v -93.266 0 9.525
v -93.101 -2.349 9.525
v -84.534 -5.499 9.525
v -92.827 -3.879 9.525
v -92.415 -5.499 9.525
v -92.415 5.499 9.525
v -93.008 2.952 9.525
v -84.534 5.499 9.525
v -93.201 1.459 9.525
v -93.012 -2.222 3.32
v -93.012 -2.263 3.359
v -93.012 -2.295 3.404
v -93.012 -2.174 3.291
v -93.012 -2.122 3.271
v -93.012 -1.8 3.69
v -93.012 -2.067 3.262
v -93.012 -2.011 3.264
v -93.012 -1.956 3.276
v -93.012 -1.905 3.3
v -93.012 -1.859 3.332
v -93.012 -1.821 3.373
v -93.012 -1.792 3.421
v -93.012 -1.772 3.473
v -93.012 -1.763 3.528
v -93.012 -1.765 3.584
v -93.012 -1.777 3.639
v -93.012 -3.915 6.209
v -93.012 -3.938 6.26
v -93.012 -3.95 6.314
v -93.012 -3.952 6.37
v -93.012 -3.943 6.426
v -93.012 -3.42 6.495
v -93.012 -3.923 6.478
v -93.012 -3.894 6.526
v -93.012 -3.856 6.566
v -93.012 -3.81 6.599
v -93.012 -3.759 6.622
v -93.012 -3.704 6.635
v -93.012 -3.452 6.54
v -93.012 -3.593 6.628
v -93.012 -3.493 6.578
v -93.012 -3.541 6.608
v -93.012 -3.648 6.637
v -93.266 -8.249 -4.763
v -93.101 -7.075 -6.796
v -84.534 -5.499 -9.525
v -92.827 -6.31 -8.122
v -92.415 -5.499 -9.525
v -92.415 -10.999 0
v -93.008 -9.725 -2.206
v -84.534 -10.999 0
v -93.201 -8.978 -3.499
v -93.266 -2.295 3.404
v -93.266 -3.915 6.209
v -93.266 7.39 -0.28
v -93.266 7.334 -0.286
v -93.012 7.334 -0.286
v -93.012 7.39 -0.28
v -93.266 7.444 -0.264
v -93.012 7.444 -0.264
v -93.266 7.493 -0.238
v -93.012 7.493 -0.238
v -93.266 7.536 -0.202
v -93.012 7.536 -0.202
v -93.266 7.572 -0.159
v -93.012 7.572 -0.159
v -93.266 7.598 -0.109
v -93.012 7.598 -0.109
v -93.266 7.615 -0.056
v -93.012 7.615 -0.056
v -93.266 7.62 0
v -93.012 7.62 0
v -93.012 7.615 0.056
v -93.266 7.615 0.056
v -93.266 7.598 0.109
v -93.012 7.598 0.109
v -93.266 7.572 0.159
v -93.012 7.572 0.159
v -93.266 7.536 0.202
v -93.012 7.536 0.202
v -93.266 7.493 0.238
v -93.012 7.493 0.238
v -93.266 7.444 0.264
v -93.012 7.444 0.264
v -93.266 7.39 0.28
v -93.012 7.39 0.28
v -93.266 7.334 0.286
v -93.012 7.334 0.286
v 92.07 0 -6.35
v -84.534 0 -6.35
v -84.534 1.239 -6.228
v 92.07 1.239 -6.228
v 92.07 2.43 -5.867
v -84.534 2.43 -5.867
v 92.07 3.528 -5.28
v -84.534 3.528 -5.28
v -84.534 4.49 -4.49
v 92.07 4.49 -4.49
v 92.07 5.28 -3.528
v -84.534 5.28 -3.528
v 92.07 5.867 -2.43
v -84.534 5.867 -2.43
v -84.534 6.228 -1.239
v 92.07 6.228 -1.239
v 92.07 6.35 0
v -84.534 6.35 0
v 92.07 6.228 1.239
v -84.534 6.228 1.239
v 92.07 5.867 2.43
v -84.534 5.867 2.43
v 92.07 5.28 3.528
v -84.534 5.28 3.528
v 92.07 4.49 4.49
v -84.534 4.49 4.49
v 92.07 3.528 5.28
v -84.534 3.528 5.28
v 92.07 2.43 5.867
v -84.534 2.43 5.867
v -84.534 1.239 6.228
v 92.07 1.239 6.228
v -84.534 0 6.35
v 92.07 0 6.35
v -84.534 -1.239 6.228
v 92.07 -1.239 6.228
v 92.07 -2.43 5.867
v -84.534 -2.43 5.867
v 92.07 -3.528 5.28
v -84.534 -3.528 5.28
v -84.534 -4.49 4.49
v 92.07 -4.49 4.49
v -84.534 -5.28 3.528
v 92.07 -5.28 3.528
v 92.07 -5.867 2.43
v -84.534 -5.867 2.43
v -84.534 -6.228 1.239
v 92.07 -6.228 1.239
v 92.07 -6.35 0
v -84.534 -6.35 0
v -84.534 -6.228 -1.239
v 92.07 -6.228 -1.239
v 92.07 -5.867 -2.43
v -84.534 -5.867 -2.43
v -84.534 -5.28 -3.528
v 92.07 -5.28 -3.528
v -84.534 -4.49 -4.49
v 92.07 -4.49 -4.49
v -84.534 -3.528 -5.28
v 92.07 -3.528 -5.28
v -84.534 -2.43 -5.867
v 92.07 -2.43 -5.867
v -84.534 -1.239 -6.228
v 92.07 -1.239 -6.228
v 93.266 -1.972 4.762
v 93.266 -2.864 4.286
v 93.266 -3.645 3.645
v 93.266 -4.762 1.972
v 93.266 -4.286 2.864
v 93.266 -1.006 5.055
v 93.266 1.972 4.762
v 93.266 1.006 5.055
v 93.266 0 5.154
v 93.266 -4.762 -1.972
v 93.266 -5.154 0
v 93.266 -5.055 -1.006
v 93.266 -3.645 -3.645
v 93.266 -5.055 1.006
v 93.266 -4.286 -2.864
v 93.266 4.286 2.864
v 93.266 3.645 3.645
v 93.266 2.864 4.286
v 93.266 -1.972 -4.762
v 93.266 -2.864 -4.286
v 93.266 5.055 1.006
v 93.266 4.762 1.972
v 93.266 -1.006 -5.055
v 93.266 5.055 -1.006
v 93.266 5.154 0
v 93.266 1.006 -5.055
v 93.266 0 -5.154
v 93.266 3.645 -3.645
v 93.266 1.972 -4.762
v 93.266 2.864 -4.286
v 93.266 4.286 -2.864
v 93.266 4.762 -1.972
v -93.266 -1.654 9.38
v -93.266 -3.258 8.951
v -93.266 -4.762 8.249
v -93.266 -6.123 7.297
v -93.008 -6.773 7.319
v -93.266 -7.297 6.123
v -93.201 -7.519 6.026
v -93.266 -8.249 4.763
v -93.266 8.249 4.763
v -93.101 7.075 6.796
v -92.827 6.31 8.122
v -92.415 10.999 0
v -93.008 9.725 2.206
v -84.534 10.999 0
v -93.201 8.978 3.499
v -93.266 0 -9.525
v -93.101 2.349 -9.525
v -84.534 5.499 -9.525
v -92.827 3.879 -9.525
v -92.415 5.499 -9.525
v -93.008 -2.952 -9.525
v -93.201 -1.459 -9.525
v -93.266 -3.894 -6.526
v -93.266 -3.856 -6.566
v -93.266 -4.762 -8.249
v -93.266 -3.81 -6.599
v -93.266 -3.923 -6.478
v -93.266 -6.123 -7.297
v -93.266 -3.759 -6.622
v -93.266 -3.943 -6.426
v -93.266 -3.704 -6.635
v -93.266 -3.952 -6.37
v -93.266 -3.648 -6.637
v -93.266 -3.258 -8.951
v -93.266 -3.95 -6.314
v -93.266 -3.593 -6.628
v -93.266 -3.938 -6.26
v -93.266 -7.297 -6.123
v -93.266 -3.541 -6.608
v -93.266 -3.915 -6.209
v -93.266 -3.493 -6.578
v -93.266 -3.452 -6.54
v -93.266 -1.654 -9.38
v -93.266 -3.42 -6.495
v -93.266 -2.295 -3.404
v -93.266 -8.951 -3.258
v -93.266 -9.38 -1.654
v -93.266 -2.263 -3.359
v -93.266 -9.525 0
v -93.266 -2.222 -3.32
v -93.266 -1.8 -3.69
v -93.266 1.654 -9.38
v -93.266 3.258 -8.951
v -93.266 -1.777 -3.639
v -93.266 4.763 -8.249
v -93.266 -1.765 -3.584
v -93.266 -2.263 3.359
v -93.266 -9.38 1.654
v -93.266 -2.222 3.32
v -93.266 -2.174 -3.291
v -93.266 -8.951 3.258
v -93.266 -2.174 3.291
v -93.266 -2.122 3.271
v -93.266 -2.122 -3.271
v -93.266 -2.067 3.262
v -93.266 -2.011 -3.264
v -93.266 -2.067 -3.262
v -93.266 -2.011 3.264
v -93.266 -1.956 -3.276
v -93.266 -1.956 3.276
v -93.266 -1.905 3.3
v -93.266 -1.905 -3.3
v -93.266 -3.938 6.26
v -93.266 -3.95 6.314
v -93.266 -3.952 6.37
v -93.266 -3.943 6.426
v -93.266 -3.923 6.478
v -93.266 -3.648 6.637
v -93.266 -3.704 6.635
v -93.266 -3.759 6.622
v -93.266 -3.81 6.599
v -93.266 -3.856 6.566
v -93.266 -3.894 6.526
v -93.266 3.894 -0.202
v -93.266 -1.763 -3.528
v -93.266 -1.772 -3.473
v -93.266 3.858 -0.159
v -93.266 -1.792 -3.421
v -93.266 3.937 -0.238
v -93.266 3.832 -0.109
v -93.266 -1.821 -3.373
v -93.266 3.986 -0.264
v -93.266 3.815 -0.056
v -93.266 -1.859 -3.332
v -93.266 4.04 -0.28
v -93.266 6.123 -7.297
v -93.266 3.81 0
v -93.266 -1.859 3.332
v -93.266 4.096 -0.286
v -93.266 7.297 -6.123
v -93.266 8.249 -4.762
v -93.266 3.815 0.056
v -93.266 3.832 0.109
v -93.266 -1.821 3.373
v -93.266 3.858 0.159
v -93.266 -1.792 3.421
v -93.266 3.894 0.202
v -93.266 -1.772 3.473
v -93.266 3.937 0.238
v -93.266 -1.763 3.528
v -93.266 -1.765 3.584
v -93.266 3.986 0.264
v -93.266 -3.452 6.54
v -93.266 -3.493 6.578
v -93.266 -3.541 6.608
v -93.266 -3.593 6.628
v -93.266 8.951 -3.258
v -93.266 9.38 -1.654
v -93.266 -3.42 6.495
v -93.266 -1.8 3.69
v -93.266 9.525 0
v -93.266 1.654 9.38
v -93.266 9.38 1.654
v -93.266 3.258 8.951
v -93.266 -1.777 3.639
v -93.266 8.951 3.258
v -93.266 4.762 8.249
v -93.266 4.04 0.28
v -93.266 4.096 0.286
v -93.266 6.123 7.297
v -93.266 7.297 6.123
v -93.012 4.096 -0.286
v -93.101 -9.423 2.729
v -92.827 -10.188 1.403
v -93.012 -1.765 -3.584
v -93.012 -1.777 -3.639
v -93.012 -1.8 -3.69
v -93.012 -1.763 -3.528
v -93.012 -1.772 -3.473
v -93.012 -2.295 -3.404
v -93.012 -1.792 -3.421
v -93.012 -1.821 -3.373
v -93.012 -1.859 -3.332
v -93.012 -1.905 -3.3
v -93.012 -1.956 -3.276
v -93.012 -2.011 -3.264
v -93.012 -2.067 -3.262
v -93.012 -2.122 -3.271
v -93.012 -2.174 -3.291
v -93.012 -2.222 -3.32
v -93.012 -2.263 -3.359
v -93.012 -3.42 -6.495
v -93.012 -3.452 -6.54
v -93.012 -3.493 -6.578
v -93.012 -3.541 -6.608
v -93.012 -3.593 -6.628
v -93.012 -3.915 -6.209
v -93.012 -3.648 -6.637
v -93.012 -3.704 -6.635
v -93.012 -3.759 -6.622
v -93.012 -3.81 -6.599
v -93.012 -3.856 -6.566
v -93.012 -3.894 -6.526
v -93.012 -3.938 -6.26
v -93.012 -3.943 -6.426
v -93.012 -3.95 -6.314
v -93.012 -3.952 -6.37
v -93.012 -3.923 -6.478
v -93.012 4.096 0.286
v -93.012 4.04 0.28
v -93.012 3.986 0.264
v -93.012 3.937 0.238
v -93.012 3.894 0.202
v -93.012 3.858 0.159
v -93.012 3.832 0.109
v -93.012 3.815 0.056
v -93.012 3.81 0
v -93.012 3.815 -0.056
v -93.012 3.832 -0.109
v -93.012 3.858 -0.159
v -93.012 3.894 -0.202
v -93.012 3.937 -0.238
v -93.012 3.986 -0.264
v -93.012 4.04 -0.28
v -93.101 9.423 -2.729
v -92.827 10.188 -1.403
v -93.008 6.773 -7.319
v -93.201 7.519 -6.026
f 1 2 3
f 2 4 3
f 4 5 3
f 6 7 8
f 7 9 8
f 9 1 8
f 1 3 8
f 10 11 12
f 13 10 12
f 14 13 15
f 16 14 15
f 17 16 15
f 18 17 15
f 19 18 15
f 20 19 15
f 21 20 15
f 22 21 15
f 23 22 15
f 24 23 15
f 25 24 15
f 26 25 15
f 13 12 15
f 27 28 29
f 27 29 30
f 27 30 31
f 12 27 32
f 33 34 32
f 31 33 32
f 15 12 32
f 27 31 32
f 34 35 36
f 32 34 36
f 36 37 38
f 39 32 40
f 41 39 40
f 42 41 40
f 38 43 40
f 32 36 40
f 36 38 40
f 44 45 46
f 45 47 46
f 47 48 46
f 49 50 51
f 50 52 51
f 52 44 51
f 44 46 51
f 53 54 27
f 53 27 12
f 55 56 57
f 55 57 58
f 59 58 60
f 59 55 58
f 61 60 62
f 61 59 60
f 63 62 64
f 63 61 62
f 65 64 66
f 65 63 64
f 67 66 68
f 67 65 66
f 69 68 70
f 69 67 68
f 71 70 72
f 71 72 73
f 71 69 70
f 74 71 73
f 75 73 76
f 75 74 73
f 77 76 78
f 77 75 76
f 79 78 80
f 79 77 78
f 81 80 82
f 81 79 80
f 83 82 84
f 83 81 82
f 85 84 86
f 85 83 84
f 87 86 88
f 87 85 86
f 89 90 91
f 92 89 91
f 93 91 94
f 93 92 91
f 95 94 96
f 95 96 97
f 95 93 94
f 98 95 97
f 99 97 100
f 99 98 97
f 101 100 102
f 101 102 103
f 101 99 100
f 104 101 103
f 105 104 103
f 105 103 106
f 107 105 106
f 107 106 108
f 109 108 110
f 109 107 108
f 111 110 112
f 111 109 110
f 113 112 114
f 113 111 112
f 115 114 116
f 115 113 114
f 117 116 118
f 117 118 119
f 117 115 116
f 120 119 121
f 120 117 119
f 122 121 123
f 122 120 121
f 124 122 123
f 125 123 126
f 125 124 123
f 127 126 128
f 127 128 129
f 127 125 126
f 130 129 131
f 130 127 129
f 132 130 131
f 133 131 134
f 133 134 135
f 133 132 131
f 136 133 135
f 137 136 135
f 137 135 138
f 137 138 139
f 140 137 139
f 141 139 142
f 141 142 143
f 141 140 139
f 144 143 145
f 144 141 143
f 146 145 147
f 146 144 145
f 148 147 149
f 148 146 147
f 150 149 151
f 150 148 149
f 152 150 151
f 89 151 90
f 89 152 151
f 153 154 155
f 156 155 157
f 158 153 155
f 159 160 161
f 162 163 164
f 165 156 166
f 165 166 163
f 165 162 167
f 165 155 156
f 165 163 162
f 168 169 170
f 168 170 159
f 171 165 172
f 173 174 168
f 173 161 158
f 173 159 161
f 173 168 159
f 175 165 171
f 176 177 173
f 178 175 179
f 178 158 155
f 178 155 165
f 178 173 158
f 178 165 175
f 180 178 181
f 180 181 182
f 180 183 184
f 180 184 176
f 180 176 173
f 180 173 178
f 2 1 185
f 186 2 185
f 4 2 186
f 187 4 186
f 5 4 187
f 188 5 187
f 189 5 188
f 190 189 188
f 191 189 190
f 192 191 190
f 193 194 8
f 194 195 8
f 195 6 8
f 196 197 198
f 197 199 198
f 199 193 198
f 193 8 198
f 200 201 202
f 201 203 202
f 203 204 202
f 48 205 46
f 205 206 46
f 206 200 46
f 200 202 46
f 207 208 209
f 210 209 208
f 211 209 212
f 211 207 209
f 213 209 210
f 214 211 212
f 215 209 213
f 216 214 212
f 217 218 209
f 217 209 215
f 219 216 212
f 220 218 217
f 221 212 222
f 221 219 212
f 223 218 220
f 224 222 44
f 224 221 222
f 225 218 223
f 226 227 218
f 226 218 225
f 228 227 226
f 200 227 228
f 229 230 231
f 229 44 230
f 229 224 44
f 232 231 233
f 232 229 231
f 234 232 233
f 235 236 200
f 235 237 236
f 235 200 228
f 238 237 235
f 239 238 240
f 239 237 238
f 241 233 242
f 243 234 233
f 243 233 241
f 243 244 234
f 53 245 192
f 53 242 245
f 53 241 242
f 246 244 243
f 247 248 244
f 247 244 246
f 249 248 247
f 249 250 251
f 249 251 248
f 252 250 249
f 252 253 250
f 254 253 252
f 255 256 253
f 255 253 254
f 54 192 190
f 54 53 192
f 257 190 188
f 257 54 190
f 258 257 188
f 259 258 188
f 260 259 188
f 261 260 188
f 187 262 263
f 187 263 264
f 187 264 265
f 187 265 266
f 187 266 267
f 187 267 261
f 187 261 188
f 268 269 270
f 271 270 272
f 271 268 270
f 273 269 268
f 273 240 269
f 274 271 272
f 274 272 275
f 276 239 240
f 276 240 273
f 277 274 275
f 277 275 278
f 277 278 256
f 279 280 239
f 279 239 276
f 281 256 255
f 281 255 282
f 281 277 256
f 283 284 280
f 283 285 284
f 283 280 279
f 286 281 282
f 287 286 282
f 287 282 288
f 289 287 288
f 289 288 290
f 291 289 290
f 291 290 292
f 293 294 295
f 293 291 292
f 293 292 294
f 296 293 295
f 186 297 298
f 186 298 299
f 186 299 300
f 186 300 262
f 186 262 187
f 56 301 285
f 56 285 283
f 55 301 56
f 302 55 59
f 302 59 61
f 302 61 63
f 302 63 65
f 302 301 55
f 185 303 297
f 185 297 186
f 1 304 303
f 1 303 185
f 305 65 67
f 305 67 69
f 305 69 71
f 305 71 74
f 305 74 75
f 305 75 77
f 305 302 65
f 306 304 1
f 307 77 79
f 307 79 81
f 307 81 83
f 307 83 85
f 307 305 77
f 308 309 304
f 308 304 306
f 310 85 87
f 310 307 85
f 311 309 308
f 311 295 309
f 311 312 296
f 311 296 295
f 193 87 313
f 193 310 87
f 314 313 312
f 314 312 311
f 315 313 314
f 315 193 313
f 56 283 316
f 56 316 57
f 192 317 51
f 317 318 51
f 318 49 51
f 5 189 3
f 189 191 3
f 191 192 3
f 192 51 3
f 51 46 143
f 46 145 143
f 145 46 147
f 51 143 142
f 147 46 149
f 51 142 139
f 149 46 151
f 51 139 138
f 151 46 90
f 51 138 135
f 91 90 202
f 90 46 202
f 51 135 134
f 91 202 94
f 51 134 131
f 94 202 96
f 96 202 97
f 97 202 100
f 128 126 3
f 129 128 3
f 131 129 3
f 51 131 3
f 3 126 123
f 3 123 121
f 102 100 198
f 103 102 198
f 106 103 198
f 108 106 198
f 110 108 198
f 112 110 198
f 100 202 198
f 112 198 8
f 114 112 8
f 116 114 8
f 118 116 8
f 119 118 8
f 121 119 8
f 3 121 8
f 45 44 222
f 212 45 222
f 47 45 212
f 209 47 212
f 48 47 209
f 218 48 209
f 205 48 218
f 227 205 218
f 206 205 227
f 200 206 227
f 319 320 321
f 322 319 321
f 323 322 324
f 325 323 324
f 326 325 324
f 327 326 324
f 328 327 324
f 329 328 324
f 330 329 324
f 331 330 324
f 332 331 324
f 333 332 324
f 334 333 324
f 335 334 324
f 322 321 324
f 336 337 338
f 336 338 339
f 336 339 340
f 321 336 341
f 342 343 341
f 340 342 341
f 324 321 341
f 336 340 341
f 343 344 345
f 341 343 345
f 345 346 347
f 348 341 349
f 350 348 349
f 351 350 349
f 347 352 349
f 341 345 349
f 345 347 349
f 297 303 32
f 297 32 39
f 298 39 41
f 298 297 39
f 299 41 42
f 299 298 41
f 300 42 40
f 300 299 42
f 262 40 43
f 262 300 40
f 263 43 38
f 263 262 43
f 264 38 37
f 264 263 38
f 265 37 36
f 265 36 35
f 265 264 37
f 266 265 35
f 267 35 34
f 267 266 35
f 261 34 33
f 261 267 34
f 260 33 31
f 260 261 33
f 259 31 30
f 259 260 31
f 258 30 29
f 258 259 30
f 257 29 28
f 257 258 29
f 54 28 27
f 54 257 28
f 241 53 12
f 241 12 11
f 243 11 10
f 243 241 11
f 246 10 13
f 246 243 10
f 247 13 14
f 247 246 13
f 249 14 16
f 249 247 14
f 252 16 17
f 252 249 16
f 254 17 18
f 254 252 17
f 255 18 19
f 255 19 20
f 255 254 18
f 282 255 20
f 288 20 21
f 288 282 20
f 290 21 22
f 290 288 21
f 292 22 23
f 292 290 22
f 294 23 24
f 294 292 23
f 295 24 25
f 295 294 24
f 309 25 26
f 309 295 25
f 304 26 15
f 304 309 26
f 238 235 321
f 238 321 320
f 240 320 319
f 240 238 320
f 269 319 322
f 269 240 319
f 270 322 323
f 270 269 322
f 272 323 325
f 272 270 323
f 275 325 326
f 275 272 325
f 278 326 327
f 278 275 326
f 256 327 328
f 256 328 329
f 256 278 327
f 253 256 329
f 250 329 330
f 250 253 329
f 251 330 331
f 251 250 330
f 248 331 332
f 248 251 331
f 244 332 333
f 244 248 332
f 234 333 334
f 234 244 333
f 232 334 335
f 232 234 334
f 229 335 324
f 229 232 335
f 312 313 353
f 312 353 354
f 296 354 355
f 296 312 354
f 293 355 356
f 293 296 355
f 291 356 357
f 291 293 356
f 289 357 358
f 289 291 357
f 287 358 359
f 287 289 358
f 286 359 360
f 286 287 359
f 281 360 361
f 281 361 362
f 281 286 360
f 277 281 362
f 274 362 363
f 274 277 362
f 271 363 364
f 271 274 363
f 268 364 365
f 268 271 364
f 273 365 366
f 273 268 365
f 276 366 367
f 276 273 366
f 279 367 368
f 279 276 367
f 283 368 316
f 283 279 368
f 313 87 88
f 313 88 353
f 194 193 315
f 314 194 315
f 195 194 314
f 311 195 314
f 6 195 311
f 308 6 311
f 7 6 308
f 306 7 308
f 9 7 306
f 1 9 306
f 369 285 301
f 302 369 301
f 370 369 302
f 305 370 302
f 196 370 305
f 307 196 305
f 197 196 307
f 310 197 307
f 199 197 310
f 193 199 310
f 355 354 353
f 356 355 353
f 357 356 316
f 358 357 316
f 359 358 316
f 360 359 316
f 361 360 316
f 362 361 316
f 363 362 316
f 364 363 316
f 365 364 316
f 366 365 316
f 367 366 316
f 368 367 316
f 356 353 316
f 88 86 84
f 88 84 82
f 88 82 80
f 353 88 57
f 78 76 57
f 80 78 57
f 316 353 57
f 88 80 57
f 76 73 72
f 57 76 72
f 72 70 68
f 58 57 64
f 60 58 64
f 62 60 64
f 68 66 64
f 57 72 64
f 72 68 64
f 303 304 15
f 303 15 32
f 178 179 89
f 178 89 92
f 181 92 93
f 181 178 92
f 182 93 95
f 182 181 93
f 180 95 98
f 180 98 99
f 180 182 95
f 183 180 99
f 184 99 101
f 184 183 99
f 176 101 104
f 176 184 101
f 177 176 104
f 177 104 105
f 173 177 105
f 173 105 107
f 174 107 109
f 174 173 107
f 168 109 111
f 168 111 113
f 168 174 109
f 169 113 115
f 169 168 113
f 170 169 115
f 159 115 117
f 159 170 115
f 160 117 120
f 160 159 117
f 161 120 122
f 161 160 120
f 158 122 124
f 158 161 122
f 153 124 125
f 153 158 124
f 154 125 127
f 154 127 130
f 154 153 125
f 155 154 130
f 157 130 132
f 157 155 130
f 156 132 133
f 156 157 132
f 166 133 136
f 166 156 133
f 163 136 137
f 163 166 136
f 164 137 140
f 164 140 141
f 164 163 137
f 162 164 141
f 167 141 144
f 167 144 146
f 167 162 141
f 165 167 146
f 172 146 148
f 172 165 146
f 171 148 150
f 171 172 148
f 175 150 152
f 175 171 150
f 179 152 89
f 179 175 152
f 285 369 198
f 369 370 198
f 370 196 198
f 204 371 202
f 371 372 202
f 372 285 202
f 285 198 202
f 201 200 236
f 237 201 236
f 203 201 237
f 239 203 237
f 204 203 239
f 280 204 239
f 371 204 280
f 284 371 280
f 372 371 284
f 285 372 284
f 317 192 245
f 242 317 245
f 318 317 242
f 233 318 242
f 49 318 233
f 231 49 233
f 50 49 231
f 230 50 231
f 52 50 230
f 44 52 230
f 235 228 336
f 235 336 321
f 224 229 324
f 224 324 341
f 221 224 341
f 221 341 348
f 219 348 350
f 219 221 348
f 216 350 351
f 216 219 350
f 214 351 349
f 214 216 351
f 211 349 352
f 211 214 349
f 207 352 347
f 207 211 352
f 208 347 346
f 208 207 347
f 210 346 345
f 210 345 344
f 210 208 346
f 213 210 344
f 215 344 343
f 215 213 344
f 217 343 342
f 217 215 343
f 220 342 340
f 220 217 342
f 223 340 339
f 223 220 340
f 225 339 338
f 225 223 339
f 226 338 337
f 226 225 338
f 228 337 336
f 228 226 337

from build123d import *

# Parameters (mm, degrees)
SKETCH5_R           = 6.35
BOSS_EXTRUDE3_DEPTH = 177.8
CHAMFER1_SIZE       = 1.195753846
BOSS_EXTRUDE4_DEPTH = 8.73125
SKETCH8_OUTSIDE_W   = 708.434
SKETCH8_OUTSIDE_H   = 711.382
SKETCH8_OUTSIDE_R   = 9.525
CUT_EXTRUDE3_DEPTH  = 187.53125
CUT_EXTRUDE3_TAPER  = 60
CUT_EXTRUDE4_DEPTH  = 0.254
CIRPATTERN1_COUNT   = 3


with BuildPart() as part:
    # Sketch5 → Boss-Extrude3 (new body)
    with BuildSketch(Plane(origin=(93.265625, 0, 0), x_dir=(0, 0, -1), z_dir=(1, 0, 0))):
        Circle(SKETCH5_R)
    extrude(amount=-BOSS_EXTRUDE3_DEPTH)

    # Chamfer1
    chamfer1_edges = [part.edges().sort_by_distance(p)[0] for p in [
        (93.265625, 0, 6.35),
    ]]
    chamfer(chamfer1_edges, length=CHAMFER1_SIZE)

    # Sketch6 → Boss-Extrude4 (add)
    with BuildSketch(Plane.ZY.offset(84.534375)):
        Polygon((9.525, 5.499261314), (0, 10.998522628), (-9.525, 5.499261314), (-9.525, -5.499261314), (0, -10.998522628), (9.525, -5.499261314), align=None)
    extrude(amount=BOSS_EXTRUDE4_DEPTH)

    # Sketch8 outside → Cut-Extrude3 (cut, through all)
    with BuildSketch(Plane.ZY.offset(93.265625)):
        Rectangle(SKETCH8_OUTSIDE_W, SKETCH8_OUTSIDE_H)
        Circle(SKETCH8_OUTSIDE_R, mode=Mode.SUBTRACT)
    extrude(amount=-CUT_EXTRUDE3_DEPTH, taper=CUT_EXTRUDE3_TAPER, mode=Mode.SUBTRACT)

    # Sketch12 → Cut-Extrude4 (cut)
    with BuildSketch(Plane.ZY.offset(93.265625)):
        with BuildLine():
            Line((0.28575, 7.33425), (0.28575, 4.09575))
            ThreePointArc((0.28575, 4.09575), (0, 3.81), (-0.28575, 4.09575))
            Line((-0.28575, 4.09575), (-0.28575, 7.33425))
            ThreePointArc((-0.28575, 7.33425), (0, 7.62), (0.28575, 7.33425))
        make_face()
    cut_extrude4 = extrude(amount=-CUT_EXTRUDE4_DEPTH, mode=Mode.SUBTRACT)

    # CirPattern1: Cut-Extrude4 ×3 about axis
    cirpattern1_axis = Axis((0, 0, 0), (1, 0, 0))
    for i in range(1, CIRPATTERN1_COUNT):
        add(cut_extrude4.rotate(cirpattern1_axis, i * 360 / CIRPATTERN1_COUNT), mode=Mode.SUBTRACT)


solid = part.part
